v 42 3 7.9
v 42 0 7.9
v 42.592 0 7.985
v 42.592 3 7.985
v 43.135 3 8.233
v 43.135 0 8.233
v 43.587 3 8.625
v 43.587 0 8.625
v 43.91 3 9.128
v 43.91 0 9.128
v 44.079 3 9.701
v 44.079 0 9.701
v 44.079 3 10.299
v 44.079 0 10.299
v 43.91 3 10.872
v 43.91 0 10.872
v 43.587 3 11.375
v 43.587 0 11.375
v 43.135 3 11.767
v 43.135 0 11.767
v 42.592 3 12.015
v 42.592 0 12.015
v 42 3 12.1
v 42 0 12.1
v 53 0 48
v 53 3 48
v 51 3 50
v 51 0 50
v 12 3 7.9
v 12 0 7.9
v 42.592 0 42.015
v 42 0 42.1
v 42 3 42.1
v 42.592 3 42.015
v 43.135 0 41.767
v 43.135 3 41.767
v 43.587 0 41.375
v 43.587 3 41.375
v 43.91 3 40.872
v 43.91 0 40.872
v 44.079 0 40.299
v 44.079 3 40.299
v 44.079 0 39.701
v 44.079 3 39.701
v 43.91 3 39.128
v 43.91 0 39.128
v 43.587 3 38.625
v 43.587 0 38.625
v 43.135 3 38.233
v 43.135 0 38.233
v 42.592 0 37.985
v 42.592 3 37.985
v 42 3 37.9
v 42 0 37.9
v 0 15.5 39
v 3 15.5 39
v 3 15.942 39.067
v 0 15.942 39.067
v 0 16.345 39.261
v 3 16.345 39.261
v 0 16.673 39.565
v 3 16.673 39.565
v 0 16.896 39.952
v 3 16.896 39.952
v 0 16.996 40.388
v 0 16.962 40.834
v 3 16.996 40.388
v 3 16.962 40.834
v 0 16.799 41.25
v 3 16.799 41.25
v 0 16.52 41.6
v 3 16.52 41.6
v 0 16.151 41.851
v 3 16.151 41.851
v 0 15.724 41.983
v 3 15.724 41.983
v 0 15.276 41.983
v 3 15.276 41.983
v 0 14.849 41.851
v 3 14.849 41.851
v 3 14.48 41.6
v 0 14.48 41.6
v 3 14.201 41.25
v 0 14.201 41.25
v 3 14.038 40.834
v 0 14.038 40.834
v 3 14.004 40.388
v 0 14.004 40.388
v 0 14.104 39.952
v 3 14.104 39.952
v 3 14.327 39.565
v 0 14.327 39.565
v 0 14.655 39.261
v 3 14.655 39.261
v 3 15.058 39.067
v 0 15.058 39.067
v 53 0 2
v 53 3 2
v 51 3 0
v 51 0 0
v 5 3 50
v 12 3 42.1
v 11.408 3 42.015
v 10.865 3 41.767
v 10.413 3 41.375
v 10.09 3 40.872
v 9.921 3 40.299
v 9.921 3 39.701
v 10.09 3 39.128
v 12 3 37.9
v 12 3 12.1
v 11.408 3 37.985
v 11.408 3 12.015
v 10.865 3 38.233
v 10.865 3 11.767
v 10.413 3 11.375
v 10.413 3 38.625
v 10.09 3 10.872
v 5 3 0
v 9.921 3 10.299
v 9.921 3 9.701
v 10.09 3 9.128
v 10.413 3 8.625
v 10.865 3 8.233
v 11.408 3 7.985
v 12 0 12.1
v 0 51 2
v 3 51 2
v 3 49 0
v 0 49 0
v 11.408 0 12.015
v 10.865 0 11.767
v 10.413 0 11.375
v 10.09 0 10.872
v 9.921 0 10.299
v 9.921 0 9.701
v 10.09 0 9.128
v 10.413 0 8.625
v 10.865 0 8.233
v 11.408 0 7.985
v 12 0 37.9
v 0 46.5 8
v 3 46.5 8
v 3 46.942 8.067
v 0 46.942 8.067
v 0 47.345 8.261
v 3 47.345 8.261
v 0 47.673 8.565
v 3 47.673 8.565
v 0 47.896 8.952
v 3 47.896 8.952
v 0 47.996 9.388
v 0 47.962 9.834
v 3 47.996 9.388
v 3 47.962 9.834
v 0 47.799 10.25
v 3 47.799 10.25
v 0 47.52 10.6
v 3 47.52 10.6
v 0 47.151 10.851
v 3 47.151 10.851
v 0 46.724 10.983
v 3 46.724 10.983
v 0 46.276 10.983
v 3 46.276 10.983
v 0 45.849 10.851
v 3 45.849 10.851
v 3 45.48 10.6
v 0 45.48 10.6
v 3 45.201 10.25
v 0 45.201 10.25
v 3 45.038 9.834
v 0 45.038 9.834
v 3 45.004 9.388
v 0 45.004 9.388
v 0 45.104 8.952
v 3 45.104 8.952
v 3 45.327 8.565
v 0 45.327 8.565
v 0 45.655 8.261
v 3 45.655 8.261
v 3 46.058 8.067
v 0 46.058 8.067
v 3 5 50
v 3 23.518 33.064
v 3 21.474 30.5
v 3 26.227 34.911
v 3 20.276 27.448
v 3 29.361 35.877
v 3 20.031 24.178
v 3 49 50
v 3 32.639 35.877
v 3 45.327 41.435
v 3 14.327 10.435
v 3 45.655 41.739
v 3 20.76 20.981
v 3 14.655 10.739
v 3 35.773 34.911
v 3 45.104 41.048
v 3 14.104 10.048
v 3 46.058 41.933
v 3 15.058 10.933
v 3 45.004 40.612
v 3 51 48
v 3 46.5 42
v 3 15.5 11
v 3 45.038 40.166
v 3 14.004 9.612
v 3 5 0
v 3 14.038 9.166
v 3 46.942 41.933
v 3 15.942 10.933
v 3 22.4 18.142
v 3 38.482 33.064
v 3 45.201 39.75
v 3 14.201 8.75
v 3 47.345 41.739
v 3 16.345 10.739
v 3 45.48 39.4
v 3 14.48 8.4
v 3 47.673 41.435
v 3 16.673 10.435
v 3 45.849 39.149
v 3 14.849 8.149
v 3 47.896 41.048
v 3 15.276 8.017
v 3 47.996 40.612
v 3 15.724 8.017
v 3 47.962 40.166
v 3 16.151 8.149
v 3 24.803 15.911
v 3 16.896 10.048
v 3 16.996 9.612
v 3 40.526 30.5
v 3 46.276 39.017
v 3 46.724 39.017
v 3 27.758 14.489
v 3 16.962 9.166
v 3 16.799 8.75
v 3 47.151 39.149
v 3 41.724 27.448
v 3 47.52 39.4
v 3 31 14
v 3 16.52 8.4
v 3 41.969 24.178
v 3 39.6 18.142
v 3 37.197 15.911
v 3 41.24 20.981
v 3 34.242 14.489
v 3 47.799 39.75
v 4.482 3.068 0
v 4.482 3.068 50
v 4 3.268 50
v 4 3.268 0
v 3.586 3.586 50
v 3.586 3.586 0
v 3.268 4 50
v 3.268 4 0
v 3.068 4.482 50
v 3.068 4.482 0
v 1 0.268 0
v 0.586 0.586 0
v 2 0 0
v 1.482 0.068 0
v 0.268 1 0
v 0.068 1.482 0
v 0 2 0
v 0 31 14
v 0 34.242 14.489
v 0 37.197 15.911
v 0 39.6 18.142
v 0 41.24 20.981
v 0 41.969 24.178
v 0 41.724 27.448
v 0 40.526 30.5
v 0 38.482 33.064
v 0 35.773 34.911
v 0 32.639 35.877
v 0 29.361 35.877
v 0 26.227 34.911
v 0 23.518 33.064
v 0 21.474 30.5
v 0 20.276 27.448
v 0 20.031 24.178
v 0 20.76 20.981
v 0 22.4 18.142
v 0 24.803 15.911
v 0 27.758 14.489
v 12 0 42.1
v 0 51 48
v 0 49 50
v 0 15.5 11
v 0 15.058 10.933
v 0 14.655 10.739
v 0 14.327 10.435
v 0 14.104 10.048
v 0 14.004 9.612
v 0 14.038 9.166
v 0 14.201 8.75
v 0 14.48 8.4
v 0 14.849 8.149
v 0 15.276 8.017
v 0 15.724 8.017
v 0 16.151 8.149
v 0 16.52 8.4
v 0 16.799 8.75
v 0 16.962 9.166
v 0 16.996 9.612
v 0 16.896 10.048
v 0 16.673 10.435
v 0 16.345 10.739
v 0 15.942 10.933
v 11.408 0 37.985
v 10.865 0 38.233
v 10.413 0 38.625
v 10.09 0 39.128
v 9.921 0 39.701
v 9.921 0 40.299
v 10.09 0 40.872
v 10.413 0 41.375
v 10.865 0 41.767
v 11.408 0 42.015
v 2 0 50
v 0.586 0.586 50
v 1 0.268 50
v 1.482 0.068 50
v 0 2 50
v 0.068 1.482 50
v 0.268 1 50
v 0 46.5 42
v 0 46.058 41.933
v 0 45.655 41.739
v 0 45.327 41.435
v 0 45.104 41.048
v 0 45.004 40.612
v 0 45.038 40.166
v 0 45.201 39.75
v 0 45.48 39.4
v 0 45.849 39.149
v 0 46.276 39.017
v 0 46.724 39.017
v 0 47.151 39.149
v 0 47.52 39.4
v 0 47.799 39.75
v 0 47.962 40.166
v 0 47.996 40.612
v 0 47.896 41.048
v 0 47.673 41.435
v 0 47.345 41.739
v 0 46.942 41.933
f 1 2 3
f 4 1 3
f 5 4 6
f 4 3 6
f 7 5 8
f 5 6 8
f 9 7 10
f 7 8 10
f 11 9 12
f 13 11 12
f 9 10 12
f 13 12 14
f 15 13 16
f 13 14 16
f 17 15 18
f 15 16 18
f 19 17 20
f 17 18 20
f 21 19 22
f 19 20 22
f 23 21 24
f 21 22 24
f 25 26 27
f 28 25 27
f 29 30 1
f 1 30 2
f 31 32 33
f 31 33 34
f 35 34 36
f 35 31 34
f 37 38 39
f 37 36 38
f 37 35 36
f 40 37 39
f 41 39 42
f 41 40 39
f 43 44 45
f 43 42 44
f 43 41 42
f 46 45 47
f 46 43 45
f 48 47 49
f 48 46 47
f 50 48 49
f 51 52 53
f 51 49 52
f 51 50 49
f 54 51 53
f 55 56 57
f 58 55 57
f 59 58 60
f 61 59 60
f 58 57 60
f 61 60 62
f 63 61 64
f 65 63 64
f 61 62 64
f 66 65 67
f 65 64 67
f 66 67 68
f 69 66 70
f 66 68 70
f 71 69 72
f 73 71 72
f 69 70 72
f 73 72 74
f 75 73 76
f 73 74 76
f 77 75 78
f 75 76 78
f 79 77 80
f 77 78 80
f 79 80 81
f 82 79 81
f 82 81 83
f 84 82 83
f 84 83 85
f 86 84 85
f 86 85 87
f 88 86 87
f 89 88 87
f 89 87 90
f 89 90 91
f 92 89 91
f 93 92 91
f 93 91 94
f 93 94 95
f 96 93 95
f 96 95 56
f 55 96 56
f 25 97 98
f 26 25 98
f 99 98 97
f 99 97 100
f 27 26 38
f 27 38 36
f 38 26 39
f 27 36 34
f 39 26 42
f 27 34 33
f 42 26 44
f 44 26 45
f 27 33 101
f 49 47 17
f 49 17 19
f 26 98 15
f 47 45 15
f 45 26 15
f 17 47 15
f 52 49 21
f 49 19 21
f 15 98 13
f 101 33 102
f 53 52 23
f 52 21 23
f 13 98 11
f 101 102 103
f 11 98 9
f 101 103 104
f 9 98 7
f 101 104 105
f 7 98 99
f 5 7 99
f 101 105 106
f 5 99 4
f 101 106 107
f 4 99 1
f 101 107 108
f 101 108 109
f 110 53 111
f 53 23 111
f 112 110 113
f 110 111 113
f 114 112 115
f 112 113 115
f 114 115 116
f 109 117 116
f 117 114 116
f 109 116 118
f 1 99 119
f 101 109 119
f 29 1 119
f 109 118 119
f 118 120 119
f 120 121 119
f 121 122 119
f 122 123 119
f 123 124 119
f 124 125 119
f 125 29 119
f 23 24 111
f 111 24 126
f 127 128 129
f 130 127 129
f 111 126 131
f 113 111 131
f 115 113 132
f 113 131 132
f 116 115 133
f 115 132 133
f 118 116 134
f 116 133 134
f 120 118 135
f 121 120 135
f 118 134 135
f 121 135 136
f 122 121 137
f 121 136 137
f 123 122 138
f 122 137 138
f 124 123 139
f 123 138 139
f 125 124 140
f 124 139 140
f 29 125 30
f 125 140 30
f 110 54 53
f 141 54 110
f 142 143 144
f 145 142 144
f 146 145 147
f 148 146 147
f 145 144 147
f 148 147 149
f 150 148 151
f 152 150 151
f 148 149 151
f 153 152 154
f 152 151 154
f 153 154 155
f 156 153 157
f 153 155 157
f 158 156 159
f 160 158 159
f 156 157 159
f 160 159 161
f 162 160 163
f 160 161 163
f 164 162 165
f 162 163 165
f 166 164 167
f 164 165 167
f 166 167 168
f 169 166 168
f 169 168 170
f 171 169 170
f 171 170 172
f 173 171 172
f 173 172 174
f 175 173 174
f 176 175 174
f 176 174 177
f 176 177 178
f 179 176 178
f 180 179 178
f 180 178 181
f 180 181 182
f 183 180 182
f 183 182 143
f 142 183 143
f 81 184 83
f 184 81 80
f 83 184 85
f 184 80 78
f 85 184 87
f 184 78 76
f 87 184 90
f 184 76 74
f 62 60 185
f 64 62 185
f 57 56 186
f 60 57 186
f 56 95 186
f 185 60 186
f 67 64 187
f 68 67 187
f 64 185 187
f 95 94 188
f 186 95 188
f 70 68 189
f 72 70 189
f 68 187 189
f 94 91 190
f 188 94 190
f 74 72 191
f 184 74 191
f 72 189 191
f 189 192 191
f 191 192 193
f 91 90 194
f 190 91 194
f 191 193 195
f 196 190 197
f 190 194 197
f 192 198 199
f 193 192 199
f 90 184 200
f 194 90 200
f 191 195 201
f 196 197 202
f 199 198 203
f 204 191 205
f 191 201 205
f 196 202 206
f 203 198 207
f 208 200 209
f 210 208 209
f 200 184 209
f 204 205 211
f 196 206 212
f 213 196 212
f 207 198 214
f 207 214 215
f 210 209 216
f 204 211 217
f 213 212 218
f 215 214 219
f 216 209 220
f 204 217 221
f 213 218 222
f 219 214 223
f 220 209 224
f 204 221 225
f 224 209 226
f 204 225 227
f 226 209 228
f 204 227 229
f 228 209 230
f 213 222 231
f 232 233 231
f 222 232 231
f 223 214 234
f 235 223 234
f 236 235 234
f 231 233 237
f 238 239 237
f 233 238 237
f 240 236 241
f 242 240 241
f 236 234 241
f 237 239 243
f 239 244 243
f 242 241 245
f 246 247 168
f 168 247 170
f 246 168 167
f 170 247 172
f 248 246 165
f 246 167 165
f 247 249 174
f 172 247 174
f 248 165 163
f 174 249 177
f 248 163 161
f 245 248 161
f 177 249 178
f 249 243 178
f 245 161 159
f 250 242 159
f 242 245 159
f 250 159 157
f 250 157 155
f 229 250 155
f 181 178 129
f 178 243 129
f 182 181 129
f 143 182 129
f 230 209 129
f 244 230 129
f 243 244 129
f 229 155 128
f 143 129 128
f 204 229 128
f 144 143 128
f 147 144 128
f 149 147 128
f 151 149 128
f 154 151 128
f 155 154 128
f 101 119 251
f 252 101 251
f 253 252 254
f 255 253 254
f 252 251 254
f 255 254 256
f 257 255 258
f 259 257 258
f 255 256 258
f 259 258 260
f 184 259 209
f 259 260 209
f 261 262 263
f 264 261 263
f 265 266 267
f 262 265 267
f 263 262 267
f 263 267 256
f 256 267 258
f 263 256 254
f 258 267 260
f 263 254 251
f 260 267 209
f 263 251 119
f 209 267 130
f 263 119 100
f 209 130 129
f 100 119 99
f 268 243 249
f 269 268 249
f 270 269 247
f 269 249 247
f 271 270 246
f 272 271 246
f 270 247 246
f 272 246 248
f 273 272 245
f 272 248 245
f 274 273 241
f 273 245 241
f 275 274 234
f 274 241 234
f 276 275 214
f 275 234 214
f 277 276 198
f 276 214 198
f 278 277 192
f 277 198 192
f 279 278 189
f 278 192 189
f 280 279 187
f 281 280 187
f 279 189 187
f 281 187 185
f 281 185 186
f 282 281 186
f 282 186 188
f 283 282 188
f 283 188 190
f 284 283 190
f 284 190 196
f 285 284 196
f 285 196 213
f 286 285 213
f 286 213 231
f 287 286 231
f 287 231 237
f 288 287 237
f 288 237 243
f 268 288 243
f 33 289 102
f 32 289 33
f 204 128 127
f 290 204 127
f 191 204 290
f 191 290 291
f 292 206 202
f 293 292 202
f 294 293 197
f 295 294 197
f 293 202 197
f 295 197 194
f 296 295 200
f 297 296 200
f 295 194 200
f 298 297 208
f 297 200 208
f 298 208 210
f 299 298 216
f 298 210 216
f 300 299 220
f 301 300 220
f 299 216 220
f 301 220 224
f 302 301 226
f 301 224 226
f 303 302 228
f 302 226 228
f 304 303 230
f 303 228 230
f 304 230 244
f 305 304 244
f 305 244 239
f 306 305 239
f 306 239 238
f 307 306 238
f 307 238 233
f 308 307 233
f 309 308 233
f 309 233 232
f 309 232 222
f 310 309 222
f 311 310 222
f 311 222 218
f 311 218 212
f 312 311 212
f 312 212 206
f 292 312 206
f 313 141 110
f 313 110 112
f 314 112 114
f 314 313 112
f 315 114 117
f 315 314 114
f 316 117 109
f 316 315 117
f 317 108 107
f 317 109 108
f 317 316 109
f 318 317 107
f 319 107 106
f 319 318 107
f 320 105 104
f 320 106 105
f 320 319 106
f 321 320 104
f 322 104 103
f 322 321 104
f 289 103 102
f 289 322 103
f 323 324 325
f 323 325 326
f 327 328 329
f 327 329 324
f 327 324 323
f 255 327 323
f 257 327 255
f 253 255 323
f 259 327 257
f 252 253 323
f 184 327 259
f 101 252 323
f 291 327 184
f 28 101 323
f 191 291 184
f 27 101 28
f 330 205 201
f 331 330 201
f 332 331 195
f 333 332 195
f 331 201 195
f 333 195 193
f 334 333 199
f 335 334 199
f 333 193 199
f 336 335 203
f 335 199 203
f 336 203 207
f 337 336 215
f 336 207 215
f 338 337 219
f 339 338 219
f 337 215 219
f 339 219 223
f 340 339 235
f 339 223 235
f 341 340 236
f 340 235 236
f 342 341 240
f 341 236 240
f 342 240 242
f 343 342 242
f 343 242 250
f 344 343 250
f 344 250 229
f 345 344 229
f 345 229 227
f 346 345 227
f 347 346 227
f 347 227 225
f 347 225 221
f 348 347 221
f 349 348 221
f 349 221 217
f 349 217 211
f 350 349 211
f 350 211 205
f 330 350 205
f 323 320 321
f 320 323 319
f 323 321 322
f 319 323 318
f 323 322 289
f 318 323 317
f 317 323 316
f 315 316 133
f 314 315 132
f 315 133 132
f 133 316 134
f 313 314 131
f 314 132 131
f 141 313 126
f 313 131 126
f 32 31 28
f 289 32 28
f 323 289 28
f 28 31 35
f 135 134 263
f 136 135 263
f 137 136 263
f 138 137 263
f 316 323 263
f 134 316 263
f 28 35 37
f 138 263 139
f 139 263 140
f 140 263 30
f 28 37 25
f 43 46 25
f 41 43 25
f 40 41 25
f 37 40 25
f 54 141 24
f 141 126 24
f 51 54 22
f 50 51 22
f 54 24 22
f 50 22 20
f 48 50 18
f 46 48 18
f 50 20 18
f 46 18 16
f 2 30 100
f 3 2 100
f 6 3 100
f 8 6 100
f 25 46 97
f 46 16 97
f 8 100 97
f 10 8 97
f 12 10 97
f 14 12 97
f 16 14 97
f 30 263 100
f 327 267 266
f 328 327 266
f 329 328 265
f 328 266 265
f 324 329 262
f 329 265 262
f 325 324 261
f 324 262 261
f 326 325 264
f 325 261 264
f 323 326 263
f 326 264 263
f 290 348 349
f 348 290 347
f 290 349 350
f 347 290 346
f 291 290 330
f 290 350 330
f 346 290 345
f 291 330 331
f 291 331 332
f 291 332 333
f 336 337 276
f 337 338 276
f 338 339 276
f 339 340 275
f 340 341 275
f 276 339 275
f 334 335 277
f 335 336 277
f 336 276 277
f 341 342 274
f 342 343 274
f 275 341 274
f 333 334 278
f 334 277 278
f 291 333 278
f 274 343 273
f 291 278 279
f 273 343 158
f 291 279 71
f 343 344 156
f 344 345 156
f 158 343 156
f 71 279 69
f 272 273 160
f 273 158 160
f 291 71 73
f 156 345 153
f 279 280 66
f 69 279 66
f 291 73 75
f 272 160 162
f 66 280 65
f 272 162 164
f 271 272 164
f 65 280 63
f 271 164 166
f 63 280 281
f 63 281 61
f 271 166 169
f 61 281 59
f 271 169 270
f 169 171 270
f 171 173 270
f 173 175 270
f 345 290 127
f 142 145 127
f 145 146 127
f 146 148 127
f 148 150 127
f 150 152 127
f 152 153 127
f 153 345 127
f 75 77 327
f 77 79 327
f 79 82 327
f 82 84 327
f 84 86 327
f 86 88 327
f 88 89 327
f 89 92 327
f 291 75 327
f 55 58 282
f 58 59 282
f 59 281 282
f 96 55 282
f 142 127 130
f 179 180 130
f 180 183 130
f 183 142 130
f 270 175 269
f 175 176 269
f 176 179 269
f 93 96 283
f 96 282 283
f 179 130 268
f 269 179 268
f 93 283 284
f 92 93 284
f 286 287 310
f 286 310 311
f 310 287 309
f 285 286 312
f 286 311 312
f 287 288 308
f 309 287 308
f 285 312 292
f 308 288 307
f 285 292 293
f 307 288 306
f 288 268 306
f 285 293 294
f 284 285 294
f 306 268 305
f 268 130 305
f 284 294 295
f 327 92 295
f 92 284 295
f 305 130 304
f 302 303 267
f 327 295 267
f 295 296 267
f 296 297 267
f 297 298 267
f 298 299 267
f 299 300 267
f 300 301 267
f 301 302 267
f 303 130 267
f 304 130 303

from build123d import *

# Parameters (mm, degrees)
Y_KSEKLIK_EKSTR_ZYON1_DEPTH = 50
IZIM2_R                     = 11
IZIM2_R_2                   = 1.5
KES_EKSTR_ZYON1_DEPTH       = 88.183714076
KES_EKSTR_ZYON2_DEPTH       = 88.252507127
KES_EKSTR_ZYON2_DEPTH_BACK  = 10
KES_EKSTR_ZYON3_DEPTH       = 88.183714076
KES_EKSTR_ZYON4_DEPTH       = 88.252507127


with BuildPart() as part:
    # Çizim1 → Yükseklik-Ekstrüzyon1 (new body)
    with BuildSketch(Plane.XY):
        with BuildLine():
            Line((0, 51), (0, 2))
            ThreePointArc((0, 2), (0.585786438, 0.585786438), (2, 0))
            Line((2, 0), (53, 0))
            Line((53, 0), (53, 3))
            Line((53, 3), (5, 3))
            ThreePointArc((5, 3), (3.585786438, 3.585786438), (3, 5))
            Line((3, 5), (3, 51))
            Line((3, 51), (0, 51))
        make_face()
    extrude(amount=Y_KSEKLIK_EKSTR_ZYON1_DEPTH)

    # Çizim2 → Kes-Ekstrüzyon1 (cut, through all)
    with BuildSketch(Plane(origin=(3, 0, 0), x_dir=(0, 0, -1), z_dir=(1, 0, 0))):
        with Locations((-25, 31)):
            Circle(IZIM2_R)
        with Locations((-9.5, 46.5)):
            Circle(IZIM2_R_2)
        with Locations(Location((-40.5, 46.5, 0), (0, 0, 180))):
            Circle(IZIM2_R_2)
        with Locations(Location((-9.5, 15.5, 0), (0, 0, 180))):
            Circle(IZIM2_R_2)
        with Locations((-40.5, 15.5)):
            Circle(IZIM2_R_2)
    extrude(amount=-KES_EKSTR_ZYON1_DEPTH, mode=Mode.SUBTRACT)

    # Çizim3 → Kes-Ekstrüzyon2 (cut, two sides: drawn at the far end of the back side and taken through both)
    with BuildSketch(Plane(origin=(0, 3, 0), x_dir=(1, 0, 0), z_dir=(0, 1, 0)).offset(-KES_EKSTR_ZYON2_DEPTH_BACK)):
        with BuildLine():
            Line((42, -12.1), (12, -12.1))
            ThreePointArc((12, -12.1), (9.9, -10), (12, -7.9))
            Line((12, -7.9), (42, -7.9))
            ThreePointArc((42, -7.9), (44.1, -10), (42, -12.1))
        make_face()
        with BuildLine():
            Line((42, -37.9), (12, -37.9))
            ThreePointArc((12, -37.9), (9.9, -40), (12, -42.1))
            Line((12, -42.1), (42, -42.1))
            ThreePointArc((42, -42.1), (44.1, -40), (42, -37.9))
        make_face()
    extrude(amount=KES_EKSTR_ZYON2_DEPTH + KES_EKSTR_ZYON2_DEPTH_BACK, mode=Mode.SUBTRACT)

    # Çizim4 → Kes-Ekstrüzyon3 (cut, through all)
    with BuildSketch(Plane(origin=(3, 0, 0), x_dir=(0, 0, -1), z_dir=(1, 0, 0))):
        Polygon((-50, 49), (-50, 51), (-48, 51), align=None)
        Polygon((0, 49), (0, 51), (-2, 51), align=None)
    extrude(amount=-KES_EKSTR_ZYON3_DEPTH, mode=Mode.SUBTRACT)

    # Çizim5 → Kes-Ekstrüzyon4 (cut, through all)
    with BuildSketch(Plane(origin=(0, 3, 0), x_dir=(1, 0, 0), z_dir=(0, 1, 0))):
        Polygon((53, -48), (51, -50), (53, -50), align=None)
        Polygon((53, 0), (53, -2), (51, 0), align=None)
    extrude(amount=-KES_EKSTR_ZYON4_DEPTH, mode=Mode.SUBTRACT)


solid = part.part
